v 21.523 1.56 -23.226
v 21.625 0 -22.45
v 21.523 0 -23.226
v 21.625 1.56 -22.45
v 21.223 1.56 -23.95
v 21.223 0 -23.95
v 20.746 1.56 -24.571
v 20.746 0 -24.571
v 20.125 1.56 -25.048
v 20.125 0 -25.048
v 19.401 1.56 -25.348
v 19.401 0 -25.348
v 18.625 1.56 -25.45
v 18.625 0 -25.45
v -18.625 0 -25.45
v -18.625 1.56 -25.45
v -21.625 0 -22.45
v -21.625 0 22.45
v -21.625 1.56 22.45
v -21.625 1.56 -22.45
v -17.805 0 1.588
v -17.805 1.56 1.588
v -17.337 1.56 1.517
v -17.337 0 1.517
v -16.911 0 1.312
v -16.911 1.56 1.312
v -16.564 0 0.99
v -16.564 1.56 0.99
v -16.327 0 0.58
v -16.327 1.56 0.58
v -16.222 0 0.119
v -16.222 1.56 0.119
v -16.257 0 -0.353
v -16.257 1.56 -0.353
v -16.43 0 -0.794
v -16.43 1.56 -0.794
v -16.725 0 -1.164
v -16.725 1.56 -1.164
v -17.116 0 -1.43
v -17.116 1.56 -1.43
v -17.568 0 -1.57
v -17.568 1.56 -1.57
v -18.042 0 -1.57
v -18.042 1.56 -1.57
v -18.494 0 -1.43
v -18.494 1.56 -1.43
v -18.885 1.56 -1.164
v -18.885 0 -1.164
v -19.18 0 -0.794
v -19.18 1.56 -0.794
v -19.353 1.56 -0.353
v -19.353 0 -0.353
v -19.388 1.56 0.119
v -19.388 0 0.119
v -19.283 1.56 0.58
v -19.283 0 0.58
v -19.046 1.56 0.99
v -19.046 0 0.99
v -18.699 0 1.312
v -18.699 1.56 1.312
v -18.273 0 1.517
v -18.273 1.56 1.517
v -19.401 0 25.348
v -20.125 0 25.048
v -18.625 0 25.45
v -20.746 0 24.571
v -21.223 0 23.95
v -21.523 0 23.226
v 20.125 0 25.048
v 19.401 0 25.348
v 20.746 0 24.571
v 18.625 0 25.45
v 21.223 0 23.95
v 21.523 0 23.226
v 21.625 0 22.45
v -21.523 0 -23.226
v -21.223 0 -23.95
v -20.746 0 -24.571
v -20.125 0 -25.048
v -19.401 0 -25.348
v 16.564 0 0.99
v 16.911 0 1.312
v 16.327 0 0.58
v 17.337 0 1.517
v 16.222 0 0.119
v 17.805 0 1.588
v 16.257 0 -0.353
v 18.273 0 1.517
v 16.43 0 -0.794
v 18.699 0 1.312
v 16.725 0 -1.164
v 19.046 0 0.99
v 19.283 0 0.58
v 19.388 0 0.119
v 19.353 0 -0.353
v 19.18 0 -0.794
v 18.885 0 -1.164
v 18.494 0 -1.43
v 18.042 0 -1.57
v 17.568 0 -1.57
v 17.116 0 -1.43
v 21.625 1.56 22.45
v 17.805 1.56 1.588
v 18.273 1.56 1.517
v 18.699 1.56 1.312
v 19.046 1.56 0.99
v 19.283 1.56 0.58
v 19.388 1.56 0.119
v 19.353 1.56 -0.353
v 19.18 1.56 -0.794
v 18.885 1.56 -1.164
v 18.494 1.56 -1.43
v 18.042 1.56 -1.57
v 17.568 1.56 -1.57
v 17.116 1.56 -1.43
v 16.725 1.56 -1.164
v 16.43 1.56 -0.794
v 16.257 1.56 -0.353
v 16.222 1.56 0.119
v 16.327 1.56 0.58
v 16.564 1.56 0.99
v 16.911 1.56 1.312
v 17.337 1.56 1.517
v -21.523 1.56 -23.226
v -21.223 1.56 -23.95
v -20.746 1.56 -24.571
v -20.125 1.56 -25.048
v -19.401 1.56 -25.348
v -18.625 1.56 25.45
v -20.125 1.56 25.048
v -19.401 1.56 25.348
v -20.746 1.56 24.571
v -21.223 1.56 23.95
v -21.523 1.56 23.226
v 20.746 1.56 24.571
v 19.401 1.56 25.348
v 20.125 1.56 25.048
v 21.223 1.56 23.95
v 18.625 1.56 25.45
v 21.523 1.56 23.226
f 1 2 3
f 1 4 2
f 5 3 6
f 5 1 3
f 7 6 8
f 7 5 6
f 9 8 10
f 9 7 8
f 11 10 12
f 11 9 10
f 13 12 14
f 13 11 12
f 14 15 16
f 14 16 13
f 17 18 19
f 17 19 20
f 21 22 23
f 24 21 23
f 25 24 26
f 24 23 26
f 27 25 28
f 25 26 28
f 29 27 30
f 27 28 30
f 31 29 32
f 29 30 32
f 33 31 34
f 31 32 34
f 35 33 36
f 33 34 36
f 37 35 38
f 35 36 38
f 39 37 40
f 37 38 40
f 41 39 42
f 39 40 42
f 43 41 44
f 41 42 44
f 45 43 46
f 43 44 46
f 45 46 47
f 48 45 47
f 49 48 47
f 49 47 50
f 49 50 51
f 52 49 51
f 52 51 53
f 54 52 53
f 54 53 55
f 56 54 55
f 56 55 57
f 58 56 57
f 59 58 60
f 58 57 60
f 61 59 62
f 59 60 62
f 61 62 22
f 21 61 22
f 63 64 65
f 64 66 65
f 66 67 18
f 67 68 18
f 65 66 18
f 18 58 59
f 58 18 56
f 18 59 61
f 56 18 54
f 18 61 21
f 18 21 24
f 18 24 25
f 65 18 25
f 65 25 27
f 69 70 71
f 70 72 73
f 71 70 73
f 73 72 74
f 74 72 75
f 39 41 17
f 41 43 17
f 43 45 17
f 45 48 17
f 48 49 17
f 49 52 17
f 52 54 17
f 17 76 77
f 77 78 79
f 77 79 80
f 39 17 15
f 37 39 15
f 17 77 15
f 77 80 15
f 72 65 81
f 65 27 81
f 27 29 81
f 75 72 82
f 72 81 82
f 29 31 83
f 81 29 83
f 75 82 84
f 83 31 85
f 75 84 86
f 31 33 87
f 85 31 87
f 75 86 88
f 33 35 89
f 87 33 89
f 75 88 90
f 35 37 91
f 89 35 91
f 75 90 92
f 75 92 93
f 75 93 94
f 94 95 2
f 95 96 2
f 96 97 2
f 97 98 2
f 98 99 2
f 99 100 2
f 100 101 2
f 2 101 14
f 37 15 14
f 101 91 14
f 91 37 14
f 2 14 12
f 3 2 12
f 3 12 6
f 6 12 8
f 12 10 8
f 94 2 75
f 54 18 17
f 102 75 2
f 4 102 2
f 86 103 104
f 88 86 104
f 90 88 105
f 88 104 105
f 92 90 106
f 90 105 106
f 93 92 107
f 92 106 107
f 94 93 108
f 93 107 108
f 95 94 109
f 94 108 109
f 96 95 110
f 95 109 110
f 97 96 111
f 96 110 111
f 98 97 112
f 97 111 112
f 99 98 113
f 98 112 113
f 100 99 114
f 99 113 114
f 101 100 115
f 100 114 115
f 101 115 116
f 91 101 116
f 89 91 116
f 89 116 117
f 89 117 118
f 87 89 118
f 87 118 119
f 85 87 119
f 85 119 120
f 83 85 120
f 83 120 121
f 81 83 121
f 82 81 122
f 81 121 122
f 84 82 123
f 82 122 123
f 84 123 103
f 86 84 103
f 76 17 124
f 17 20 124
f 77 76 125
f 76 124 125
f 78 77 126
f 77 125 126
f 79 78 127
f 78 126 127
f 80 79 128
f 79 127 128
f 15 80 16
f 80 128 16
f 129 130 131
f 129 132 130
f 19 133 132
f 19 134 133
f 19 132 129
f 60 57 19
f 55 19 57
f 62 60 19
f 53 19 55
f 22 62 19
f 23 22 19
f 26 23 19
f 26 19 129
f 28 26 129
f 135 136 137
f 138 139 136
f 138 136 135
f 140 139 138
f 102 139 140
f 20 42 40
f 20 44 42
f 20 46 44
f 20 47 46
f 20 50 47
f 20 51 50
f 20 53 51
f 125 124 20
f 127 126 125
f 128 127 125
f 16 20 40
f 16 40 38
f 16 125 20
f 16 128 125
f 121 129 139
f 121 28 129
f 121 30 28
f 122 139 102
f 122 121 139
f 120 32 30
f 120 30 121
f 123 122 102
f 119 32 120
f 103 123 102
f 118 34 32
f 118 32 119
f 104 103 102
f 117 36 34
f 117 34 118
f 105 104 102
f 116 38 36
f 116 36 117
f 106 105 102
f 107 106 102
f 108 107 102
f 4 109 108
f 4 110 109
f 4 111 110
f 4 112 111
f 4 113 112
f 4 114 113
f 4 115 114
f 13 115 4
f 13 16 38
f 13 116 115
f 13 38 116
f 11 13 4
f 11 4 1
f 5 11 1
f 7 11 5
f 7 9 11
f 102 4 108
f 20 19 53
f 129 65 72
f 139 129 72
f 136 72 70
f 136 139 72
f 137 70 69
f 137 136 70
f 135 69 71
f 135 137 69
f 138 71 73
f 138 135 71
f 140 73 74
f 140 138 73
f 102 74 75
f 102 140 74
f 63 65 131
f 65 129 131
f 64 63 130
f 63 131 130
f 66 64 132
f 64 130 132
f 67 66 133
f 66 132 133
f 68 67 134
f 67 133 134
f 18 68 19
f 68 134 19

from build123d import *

# Parameters (mm, degrees)
SKETCH1_W           = 43.25
SKETCH1_H           = 50.9
BOSS_EXTRUDE1_DEPTH = 1.56
FILLET1_R           = 3
FILLET2_R           = 3
SKETCH2_R           = 1.5875
CUT_EXTRUDE1_DEPTH  = 1.56


with BuildPart() as part:
    # Sketch1 → Boss-Extrude1 (new body)
    with BuildSketch(Plane(origin=(0, 0, 0), x_dir=(1, 0, 0), z_dir=(0, 1, 0))):
        Rectangle(SKETCH1_W, SKETCH1_H)
    extrude(amount=BOSS_EXTRUDE1_DEPTH)

    # Fillet1
    fillet1_edges = [part.edges().sort_by_distance(p)[0] for p in [
        (21.625, 0.78, 25.45),
    ]]
    fillet(fillet1_edges, radius=FILLET1_R)

    # Fillet2
    fillet2_edges = [part.edges().sort_by_distance(p)[0] for p in [
        (-21.625, 0.78, -25.45),
        (21.625, 0.78, -25.45),
        (-21.625, 0.78, 25.45),
    ]]
    fillet(fillet2_edges, radius=FILLET2_R)

    # Sketch2 → Cut-Extrude1 (cut)
    with BuildSketch(Plane(origin=(0, 1.56, 0), x_dir=(1, 0, 0), z_dir=(0, 1, 0))):
        with Locations(Location((-17.805, 0, 0), (0, 0, 270))):
            Circle(SKETCH2_R)
        with Locations(Location((17.805, 0, 0), (0, 0, 270))):
            Circle(SKETCH2_R)
    extrude(amount=-CUT_EXTRUDE1_DEPTH, mode=Mode.SUBTRACT)


solid = part.part
